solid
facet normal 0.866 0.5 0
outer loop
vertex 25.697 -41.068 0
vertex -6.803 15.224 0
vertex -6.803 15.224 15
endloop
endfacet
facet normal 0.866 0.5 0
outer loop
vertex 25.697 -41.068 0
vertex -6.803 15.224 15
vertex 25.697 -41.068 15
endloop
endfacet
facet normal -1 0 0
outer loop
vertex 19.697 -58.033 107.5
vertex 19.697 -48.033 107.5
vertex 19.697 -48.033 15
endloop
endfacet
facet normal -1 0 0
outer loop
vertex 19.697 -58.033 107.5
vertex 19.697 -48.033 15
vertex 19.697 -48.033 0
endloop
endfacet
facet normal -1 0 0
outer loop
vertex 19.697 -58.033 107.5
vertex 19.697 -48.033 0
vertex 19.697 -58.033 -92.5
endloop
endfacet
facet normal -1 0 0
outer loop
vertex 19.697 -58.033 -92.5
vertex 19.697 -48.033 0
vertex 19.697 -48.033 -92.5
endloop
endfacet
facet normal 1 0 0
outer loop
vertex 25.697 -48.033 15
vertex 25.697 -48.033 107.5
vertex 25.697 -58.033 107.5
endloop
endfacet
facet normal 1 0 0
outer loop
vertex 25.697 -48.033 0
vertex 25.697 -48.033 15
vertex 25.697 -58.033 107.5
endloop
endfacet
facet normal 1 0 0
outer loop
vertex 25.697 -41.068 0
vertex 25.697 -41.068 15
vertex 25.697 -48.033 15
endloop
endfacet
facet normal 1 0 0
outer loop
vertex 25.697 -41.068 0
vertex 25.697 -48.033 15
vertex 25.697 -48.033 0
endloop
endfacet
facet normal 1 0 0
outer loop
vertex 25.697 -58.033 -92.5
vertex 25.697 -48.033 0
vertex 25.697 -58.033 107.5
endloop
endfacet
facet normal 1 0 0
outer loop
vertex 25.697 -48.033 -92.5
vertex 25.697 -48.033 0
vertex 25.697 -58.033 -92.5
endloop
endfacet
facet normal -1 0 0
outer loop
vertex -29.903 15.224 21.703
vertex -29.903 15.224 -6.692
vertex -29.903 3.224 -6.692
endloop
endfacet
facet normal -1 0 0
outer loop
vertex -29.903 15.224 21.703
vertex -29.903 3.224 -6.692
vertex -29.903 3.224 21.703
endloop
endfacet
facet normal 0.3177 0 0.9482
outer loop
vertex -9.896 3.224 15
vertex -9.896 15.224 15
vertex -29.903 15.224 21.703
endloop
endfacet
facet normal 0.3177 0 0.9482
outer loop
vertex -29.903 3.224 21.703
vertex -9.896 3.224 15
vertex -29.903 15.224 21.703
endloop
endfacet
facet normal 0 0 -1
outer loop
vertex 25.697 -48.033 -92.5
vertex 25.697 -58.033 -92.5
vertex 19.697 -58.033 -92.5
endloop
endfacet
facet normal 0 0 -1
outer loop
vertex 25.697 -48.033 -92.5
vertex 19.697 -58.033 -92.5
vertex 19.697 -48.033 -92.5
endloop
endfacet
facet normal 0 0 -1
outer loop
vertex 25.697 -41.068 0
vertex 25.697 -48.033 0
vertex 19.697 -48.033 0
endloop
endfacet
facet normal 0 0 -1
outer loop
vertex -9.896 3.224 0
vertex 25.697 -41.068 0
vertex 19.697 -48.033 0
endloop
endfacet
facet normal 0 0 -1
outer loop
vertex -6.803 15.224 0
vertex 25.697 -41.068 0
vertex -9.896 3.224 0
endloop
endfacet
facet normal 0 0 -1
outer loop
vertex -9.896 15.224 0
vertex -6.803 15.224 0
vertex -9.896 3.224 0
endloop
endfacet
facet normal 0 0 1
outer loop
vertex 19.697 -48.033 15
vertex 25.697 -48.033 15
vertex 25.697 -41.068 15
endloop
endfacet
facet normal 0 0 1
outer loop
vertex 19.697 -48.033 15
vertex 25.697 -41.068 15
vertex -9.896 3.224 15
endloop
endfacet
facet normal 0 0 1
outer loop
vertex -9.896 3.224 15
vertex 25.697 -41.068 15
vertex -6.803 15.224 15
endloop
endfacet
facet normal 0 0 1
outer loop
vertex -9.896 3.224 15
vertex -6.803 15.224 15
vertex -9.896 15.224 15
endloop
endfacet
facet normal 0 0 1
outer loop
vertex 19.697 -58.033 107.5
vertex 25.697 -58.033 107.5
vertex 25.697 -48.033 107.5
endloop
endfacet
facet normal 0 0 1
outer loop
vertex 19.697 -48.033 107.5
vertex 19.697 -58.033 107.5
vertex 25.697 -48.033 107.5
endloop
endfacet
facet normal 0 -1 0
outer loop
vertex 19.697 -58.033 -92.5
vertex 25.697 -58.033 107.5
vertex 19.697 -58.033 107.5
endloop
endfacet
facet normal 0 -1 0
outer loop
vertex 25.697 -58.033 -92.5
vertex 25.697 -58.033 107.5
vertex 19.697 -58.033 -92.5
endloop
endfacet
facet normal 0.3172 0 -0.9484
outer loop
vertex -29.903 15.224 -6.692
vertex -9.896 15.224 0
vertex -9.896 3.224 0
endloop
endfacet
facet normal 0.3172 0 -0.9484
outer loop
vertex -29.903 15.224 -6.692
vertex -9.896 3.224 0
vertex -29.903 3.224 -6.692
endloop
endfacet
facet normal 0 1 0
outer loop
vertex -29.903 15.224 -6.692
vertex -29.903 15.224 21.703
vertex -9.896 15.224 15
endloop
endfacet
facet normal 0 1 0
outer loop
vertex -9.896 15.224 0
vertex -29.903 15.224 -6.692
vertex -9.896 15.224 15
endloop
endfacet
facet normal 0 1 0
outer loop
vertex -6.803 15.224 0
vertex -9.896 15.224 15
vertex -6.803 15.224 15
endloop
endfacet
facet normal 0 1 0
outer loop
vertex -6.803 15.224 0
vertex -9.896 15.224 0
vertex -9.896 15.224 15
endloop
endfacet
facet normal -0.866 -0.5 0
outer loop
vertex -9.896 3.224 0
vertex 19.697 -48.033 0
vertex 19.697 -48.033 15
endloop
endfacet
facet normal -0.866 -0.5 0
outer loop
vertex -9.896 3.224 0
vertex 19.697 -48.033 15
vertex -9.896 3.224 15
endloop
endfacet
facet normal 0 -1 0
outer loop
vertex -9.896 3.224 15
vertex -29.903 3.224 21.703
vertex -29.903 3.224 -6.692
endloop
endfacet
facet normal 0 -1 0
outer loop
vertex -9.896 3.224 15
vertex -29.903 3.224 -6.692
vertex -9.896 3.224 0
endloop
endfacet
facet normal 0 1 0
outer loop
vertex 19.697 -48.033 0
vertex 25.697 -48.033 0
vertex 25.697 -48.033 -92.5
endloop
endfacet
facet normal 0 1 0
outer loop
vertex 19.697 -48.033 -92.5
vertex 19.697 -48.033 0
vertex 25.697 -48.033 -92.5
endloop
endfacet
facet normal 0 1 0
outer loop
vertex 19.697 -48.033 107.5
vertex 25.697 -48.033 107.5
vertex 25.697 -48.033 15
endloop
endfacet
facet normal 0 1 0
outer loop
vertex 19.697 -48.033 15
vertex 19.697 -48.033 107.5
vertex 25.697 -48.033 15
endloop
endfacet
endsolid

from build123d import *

# Parameters (mm, degrees)
BOSS_EXTRU_1_DEPTH = 15
ESQUISSE5_W        = 200
ESQUISSE5_H        = 10
BOSS_EXTRU_4_DEPTH = 6
BOSS_EXTRU_5_DEPTH = 12
BOSS_EXTRU_6_DEPTH = 12


with BuildPart() as part:
    # Esquisse1 → Boss.-Extru.1 (new body)
    with BuildSketch(Plane.XY):
        Polygon((-29.902548443, 15.22370444), (-6.802548443, 15.22370444), (25.697451557, -41.067946806), (25.697451557, -58.033349019), (19.697451557, -58.033349019), (19.697451557, -48.033349019), (-9.895822056, 3.22370444), (-29.902548443, 3.22370444), align=None)
    extrude(amount=BOSS_EXTRU_1_DEPTH)

    # Esquisse5 → Boss.-Extru.4 (add)
    with BuildSketch(Plane(origin=(25.697451557, 0, 0), x_dir=(0, 0, -1), z_dir=(1, 0, 0))):
        with Locations((-7.5, -53.033349019)):
            Rectangle(ESQUISSE5_W, ESQUISSE5_H)
    extrude(amount=-BOSS_EXTRU_4_DEPTH)

    # Esquisse6 → Boss.-Extru.5 (add)
    with BuildSketch(Plane(origin=(0, 15.22370444, 0), x_dir=(1, 0, 0), z_dir=(0, 1, 0))):
        Polygon((-29.902548443, -15), (-9.895822056, -15), (-29.902548443, -21.702554703), align=None)
    extrude(amount=-BOSS_EXTRU_5_DEPTH)

    # Esquisse7 → Boss.-Extru.6 (add)
    with BuildSketch(Plane(origin=(0, 15.22370444, 0), x_dir=(1, 0, 0), z_dir=(0, 1, 0))):
        Polygon((-29.902548443, 0), (-9.895822056, 0), (-29.902548443, 6.692394801), align=None)
    extrude(amount=-BOSS_EXTRU_6_DEPTH)


solid = part.part
